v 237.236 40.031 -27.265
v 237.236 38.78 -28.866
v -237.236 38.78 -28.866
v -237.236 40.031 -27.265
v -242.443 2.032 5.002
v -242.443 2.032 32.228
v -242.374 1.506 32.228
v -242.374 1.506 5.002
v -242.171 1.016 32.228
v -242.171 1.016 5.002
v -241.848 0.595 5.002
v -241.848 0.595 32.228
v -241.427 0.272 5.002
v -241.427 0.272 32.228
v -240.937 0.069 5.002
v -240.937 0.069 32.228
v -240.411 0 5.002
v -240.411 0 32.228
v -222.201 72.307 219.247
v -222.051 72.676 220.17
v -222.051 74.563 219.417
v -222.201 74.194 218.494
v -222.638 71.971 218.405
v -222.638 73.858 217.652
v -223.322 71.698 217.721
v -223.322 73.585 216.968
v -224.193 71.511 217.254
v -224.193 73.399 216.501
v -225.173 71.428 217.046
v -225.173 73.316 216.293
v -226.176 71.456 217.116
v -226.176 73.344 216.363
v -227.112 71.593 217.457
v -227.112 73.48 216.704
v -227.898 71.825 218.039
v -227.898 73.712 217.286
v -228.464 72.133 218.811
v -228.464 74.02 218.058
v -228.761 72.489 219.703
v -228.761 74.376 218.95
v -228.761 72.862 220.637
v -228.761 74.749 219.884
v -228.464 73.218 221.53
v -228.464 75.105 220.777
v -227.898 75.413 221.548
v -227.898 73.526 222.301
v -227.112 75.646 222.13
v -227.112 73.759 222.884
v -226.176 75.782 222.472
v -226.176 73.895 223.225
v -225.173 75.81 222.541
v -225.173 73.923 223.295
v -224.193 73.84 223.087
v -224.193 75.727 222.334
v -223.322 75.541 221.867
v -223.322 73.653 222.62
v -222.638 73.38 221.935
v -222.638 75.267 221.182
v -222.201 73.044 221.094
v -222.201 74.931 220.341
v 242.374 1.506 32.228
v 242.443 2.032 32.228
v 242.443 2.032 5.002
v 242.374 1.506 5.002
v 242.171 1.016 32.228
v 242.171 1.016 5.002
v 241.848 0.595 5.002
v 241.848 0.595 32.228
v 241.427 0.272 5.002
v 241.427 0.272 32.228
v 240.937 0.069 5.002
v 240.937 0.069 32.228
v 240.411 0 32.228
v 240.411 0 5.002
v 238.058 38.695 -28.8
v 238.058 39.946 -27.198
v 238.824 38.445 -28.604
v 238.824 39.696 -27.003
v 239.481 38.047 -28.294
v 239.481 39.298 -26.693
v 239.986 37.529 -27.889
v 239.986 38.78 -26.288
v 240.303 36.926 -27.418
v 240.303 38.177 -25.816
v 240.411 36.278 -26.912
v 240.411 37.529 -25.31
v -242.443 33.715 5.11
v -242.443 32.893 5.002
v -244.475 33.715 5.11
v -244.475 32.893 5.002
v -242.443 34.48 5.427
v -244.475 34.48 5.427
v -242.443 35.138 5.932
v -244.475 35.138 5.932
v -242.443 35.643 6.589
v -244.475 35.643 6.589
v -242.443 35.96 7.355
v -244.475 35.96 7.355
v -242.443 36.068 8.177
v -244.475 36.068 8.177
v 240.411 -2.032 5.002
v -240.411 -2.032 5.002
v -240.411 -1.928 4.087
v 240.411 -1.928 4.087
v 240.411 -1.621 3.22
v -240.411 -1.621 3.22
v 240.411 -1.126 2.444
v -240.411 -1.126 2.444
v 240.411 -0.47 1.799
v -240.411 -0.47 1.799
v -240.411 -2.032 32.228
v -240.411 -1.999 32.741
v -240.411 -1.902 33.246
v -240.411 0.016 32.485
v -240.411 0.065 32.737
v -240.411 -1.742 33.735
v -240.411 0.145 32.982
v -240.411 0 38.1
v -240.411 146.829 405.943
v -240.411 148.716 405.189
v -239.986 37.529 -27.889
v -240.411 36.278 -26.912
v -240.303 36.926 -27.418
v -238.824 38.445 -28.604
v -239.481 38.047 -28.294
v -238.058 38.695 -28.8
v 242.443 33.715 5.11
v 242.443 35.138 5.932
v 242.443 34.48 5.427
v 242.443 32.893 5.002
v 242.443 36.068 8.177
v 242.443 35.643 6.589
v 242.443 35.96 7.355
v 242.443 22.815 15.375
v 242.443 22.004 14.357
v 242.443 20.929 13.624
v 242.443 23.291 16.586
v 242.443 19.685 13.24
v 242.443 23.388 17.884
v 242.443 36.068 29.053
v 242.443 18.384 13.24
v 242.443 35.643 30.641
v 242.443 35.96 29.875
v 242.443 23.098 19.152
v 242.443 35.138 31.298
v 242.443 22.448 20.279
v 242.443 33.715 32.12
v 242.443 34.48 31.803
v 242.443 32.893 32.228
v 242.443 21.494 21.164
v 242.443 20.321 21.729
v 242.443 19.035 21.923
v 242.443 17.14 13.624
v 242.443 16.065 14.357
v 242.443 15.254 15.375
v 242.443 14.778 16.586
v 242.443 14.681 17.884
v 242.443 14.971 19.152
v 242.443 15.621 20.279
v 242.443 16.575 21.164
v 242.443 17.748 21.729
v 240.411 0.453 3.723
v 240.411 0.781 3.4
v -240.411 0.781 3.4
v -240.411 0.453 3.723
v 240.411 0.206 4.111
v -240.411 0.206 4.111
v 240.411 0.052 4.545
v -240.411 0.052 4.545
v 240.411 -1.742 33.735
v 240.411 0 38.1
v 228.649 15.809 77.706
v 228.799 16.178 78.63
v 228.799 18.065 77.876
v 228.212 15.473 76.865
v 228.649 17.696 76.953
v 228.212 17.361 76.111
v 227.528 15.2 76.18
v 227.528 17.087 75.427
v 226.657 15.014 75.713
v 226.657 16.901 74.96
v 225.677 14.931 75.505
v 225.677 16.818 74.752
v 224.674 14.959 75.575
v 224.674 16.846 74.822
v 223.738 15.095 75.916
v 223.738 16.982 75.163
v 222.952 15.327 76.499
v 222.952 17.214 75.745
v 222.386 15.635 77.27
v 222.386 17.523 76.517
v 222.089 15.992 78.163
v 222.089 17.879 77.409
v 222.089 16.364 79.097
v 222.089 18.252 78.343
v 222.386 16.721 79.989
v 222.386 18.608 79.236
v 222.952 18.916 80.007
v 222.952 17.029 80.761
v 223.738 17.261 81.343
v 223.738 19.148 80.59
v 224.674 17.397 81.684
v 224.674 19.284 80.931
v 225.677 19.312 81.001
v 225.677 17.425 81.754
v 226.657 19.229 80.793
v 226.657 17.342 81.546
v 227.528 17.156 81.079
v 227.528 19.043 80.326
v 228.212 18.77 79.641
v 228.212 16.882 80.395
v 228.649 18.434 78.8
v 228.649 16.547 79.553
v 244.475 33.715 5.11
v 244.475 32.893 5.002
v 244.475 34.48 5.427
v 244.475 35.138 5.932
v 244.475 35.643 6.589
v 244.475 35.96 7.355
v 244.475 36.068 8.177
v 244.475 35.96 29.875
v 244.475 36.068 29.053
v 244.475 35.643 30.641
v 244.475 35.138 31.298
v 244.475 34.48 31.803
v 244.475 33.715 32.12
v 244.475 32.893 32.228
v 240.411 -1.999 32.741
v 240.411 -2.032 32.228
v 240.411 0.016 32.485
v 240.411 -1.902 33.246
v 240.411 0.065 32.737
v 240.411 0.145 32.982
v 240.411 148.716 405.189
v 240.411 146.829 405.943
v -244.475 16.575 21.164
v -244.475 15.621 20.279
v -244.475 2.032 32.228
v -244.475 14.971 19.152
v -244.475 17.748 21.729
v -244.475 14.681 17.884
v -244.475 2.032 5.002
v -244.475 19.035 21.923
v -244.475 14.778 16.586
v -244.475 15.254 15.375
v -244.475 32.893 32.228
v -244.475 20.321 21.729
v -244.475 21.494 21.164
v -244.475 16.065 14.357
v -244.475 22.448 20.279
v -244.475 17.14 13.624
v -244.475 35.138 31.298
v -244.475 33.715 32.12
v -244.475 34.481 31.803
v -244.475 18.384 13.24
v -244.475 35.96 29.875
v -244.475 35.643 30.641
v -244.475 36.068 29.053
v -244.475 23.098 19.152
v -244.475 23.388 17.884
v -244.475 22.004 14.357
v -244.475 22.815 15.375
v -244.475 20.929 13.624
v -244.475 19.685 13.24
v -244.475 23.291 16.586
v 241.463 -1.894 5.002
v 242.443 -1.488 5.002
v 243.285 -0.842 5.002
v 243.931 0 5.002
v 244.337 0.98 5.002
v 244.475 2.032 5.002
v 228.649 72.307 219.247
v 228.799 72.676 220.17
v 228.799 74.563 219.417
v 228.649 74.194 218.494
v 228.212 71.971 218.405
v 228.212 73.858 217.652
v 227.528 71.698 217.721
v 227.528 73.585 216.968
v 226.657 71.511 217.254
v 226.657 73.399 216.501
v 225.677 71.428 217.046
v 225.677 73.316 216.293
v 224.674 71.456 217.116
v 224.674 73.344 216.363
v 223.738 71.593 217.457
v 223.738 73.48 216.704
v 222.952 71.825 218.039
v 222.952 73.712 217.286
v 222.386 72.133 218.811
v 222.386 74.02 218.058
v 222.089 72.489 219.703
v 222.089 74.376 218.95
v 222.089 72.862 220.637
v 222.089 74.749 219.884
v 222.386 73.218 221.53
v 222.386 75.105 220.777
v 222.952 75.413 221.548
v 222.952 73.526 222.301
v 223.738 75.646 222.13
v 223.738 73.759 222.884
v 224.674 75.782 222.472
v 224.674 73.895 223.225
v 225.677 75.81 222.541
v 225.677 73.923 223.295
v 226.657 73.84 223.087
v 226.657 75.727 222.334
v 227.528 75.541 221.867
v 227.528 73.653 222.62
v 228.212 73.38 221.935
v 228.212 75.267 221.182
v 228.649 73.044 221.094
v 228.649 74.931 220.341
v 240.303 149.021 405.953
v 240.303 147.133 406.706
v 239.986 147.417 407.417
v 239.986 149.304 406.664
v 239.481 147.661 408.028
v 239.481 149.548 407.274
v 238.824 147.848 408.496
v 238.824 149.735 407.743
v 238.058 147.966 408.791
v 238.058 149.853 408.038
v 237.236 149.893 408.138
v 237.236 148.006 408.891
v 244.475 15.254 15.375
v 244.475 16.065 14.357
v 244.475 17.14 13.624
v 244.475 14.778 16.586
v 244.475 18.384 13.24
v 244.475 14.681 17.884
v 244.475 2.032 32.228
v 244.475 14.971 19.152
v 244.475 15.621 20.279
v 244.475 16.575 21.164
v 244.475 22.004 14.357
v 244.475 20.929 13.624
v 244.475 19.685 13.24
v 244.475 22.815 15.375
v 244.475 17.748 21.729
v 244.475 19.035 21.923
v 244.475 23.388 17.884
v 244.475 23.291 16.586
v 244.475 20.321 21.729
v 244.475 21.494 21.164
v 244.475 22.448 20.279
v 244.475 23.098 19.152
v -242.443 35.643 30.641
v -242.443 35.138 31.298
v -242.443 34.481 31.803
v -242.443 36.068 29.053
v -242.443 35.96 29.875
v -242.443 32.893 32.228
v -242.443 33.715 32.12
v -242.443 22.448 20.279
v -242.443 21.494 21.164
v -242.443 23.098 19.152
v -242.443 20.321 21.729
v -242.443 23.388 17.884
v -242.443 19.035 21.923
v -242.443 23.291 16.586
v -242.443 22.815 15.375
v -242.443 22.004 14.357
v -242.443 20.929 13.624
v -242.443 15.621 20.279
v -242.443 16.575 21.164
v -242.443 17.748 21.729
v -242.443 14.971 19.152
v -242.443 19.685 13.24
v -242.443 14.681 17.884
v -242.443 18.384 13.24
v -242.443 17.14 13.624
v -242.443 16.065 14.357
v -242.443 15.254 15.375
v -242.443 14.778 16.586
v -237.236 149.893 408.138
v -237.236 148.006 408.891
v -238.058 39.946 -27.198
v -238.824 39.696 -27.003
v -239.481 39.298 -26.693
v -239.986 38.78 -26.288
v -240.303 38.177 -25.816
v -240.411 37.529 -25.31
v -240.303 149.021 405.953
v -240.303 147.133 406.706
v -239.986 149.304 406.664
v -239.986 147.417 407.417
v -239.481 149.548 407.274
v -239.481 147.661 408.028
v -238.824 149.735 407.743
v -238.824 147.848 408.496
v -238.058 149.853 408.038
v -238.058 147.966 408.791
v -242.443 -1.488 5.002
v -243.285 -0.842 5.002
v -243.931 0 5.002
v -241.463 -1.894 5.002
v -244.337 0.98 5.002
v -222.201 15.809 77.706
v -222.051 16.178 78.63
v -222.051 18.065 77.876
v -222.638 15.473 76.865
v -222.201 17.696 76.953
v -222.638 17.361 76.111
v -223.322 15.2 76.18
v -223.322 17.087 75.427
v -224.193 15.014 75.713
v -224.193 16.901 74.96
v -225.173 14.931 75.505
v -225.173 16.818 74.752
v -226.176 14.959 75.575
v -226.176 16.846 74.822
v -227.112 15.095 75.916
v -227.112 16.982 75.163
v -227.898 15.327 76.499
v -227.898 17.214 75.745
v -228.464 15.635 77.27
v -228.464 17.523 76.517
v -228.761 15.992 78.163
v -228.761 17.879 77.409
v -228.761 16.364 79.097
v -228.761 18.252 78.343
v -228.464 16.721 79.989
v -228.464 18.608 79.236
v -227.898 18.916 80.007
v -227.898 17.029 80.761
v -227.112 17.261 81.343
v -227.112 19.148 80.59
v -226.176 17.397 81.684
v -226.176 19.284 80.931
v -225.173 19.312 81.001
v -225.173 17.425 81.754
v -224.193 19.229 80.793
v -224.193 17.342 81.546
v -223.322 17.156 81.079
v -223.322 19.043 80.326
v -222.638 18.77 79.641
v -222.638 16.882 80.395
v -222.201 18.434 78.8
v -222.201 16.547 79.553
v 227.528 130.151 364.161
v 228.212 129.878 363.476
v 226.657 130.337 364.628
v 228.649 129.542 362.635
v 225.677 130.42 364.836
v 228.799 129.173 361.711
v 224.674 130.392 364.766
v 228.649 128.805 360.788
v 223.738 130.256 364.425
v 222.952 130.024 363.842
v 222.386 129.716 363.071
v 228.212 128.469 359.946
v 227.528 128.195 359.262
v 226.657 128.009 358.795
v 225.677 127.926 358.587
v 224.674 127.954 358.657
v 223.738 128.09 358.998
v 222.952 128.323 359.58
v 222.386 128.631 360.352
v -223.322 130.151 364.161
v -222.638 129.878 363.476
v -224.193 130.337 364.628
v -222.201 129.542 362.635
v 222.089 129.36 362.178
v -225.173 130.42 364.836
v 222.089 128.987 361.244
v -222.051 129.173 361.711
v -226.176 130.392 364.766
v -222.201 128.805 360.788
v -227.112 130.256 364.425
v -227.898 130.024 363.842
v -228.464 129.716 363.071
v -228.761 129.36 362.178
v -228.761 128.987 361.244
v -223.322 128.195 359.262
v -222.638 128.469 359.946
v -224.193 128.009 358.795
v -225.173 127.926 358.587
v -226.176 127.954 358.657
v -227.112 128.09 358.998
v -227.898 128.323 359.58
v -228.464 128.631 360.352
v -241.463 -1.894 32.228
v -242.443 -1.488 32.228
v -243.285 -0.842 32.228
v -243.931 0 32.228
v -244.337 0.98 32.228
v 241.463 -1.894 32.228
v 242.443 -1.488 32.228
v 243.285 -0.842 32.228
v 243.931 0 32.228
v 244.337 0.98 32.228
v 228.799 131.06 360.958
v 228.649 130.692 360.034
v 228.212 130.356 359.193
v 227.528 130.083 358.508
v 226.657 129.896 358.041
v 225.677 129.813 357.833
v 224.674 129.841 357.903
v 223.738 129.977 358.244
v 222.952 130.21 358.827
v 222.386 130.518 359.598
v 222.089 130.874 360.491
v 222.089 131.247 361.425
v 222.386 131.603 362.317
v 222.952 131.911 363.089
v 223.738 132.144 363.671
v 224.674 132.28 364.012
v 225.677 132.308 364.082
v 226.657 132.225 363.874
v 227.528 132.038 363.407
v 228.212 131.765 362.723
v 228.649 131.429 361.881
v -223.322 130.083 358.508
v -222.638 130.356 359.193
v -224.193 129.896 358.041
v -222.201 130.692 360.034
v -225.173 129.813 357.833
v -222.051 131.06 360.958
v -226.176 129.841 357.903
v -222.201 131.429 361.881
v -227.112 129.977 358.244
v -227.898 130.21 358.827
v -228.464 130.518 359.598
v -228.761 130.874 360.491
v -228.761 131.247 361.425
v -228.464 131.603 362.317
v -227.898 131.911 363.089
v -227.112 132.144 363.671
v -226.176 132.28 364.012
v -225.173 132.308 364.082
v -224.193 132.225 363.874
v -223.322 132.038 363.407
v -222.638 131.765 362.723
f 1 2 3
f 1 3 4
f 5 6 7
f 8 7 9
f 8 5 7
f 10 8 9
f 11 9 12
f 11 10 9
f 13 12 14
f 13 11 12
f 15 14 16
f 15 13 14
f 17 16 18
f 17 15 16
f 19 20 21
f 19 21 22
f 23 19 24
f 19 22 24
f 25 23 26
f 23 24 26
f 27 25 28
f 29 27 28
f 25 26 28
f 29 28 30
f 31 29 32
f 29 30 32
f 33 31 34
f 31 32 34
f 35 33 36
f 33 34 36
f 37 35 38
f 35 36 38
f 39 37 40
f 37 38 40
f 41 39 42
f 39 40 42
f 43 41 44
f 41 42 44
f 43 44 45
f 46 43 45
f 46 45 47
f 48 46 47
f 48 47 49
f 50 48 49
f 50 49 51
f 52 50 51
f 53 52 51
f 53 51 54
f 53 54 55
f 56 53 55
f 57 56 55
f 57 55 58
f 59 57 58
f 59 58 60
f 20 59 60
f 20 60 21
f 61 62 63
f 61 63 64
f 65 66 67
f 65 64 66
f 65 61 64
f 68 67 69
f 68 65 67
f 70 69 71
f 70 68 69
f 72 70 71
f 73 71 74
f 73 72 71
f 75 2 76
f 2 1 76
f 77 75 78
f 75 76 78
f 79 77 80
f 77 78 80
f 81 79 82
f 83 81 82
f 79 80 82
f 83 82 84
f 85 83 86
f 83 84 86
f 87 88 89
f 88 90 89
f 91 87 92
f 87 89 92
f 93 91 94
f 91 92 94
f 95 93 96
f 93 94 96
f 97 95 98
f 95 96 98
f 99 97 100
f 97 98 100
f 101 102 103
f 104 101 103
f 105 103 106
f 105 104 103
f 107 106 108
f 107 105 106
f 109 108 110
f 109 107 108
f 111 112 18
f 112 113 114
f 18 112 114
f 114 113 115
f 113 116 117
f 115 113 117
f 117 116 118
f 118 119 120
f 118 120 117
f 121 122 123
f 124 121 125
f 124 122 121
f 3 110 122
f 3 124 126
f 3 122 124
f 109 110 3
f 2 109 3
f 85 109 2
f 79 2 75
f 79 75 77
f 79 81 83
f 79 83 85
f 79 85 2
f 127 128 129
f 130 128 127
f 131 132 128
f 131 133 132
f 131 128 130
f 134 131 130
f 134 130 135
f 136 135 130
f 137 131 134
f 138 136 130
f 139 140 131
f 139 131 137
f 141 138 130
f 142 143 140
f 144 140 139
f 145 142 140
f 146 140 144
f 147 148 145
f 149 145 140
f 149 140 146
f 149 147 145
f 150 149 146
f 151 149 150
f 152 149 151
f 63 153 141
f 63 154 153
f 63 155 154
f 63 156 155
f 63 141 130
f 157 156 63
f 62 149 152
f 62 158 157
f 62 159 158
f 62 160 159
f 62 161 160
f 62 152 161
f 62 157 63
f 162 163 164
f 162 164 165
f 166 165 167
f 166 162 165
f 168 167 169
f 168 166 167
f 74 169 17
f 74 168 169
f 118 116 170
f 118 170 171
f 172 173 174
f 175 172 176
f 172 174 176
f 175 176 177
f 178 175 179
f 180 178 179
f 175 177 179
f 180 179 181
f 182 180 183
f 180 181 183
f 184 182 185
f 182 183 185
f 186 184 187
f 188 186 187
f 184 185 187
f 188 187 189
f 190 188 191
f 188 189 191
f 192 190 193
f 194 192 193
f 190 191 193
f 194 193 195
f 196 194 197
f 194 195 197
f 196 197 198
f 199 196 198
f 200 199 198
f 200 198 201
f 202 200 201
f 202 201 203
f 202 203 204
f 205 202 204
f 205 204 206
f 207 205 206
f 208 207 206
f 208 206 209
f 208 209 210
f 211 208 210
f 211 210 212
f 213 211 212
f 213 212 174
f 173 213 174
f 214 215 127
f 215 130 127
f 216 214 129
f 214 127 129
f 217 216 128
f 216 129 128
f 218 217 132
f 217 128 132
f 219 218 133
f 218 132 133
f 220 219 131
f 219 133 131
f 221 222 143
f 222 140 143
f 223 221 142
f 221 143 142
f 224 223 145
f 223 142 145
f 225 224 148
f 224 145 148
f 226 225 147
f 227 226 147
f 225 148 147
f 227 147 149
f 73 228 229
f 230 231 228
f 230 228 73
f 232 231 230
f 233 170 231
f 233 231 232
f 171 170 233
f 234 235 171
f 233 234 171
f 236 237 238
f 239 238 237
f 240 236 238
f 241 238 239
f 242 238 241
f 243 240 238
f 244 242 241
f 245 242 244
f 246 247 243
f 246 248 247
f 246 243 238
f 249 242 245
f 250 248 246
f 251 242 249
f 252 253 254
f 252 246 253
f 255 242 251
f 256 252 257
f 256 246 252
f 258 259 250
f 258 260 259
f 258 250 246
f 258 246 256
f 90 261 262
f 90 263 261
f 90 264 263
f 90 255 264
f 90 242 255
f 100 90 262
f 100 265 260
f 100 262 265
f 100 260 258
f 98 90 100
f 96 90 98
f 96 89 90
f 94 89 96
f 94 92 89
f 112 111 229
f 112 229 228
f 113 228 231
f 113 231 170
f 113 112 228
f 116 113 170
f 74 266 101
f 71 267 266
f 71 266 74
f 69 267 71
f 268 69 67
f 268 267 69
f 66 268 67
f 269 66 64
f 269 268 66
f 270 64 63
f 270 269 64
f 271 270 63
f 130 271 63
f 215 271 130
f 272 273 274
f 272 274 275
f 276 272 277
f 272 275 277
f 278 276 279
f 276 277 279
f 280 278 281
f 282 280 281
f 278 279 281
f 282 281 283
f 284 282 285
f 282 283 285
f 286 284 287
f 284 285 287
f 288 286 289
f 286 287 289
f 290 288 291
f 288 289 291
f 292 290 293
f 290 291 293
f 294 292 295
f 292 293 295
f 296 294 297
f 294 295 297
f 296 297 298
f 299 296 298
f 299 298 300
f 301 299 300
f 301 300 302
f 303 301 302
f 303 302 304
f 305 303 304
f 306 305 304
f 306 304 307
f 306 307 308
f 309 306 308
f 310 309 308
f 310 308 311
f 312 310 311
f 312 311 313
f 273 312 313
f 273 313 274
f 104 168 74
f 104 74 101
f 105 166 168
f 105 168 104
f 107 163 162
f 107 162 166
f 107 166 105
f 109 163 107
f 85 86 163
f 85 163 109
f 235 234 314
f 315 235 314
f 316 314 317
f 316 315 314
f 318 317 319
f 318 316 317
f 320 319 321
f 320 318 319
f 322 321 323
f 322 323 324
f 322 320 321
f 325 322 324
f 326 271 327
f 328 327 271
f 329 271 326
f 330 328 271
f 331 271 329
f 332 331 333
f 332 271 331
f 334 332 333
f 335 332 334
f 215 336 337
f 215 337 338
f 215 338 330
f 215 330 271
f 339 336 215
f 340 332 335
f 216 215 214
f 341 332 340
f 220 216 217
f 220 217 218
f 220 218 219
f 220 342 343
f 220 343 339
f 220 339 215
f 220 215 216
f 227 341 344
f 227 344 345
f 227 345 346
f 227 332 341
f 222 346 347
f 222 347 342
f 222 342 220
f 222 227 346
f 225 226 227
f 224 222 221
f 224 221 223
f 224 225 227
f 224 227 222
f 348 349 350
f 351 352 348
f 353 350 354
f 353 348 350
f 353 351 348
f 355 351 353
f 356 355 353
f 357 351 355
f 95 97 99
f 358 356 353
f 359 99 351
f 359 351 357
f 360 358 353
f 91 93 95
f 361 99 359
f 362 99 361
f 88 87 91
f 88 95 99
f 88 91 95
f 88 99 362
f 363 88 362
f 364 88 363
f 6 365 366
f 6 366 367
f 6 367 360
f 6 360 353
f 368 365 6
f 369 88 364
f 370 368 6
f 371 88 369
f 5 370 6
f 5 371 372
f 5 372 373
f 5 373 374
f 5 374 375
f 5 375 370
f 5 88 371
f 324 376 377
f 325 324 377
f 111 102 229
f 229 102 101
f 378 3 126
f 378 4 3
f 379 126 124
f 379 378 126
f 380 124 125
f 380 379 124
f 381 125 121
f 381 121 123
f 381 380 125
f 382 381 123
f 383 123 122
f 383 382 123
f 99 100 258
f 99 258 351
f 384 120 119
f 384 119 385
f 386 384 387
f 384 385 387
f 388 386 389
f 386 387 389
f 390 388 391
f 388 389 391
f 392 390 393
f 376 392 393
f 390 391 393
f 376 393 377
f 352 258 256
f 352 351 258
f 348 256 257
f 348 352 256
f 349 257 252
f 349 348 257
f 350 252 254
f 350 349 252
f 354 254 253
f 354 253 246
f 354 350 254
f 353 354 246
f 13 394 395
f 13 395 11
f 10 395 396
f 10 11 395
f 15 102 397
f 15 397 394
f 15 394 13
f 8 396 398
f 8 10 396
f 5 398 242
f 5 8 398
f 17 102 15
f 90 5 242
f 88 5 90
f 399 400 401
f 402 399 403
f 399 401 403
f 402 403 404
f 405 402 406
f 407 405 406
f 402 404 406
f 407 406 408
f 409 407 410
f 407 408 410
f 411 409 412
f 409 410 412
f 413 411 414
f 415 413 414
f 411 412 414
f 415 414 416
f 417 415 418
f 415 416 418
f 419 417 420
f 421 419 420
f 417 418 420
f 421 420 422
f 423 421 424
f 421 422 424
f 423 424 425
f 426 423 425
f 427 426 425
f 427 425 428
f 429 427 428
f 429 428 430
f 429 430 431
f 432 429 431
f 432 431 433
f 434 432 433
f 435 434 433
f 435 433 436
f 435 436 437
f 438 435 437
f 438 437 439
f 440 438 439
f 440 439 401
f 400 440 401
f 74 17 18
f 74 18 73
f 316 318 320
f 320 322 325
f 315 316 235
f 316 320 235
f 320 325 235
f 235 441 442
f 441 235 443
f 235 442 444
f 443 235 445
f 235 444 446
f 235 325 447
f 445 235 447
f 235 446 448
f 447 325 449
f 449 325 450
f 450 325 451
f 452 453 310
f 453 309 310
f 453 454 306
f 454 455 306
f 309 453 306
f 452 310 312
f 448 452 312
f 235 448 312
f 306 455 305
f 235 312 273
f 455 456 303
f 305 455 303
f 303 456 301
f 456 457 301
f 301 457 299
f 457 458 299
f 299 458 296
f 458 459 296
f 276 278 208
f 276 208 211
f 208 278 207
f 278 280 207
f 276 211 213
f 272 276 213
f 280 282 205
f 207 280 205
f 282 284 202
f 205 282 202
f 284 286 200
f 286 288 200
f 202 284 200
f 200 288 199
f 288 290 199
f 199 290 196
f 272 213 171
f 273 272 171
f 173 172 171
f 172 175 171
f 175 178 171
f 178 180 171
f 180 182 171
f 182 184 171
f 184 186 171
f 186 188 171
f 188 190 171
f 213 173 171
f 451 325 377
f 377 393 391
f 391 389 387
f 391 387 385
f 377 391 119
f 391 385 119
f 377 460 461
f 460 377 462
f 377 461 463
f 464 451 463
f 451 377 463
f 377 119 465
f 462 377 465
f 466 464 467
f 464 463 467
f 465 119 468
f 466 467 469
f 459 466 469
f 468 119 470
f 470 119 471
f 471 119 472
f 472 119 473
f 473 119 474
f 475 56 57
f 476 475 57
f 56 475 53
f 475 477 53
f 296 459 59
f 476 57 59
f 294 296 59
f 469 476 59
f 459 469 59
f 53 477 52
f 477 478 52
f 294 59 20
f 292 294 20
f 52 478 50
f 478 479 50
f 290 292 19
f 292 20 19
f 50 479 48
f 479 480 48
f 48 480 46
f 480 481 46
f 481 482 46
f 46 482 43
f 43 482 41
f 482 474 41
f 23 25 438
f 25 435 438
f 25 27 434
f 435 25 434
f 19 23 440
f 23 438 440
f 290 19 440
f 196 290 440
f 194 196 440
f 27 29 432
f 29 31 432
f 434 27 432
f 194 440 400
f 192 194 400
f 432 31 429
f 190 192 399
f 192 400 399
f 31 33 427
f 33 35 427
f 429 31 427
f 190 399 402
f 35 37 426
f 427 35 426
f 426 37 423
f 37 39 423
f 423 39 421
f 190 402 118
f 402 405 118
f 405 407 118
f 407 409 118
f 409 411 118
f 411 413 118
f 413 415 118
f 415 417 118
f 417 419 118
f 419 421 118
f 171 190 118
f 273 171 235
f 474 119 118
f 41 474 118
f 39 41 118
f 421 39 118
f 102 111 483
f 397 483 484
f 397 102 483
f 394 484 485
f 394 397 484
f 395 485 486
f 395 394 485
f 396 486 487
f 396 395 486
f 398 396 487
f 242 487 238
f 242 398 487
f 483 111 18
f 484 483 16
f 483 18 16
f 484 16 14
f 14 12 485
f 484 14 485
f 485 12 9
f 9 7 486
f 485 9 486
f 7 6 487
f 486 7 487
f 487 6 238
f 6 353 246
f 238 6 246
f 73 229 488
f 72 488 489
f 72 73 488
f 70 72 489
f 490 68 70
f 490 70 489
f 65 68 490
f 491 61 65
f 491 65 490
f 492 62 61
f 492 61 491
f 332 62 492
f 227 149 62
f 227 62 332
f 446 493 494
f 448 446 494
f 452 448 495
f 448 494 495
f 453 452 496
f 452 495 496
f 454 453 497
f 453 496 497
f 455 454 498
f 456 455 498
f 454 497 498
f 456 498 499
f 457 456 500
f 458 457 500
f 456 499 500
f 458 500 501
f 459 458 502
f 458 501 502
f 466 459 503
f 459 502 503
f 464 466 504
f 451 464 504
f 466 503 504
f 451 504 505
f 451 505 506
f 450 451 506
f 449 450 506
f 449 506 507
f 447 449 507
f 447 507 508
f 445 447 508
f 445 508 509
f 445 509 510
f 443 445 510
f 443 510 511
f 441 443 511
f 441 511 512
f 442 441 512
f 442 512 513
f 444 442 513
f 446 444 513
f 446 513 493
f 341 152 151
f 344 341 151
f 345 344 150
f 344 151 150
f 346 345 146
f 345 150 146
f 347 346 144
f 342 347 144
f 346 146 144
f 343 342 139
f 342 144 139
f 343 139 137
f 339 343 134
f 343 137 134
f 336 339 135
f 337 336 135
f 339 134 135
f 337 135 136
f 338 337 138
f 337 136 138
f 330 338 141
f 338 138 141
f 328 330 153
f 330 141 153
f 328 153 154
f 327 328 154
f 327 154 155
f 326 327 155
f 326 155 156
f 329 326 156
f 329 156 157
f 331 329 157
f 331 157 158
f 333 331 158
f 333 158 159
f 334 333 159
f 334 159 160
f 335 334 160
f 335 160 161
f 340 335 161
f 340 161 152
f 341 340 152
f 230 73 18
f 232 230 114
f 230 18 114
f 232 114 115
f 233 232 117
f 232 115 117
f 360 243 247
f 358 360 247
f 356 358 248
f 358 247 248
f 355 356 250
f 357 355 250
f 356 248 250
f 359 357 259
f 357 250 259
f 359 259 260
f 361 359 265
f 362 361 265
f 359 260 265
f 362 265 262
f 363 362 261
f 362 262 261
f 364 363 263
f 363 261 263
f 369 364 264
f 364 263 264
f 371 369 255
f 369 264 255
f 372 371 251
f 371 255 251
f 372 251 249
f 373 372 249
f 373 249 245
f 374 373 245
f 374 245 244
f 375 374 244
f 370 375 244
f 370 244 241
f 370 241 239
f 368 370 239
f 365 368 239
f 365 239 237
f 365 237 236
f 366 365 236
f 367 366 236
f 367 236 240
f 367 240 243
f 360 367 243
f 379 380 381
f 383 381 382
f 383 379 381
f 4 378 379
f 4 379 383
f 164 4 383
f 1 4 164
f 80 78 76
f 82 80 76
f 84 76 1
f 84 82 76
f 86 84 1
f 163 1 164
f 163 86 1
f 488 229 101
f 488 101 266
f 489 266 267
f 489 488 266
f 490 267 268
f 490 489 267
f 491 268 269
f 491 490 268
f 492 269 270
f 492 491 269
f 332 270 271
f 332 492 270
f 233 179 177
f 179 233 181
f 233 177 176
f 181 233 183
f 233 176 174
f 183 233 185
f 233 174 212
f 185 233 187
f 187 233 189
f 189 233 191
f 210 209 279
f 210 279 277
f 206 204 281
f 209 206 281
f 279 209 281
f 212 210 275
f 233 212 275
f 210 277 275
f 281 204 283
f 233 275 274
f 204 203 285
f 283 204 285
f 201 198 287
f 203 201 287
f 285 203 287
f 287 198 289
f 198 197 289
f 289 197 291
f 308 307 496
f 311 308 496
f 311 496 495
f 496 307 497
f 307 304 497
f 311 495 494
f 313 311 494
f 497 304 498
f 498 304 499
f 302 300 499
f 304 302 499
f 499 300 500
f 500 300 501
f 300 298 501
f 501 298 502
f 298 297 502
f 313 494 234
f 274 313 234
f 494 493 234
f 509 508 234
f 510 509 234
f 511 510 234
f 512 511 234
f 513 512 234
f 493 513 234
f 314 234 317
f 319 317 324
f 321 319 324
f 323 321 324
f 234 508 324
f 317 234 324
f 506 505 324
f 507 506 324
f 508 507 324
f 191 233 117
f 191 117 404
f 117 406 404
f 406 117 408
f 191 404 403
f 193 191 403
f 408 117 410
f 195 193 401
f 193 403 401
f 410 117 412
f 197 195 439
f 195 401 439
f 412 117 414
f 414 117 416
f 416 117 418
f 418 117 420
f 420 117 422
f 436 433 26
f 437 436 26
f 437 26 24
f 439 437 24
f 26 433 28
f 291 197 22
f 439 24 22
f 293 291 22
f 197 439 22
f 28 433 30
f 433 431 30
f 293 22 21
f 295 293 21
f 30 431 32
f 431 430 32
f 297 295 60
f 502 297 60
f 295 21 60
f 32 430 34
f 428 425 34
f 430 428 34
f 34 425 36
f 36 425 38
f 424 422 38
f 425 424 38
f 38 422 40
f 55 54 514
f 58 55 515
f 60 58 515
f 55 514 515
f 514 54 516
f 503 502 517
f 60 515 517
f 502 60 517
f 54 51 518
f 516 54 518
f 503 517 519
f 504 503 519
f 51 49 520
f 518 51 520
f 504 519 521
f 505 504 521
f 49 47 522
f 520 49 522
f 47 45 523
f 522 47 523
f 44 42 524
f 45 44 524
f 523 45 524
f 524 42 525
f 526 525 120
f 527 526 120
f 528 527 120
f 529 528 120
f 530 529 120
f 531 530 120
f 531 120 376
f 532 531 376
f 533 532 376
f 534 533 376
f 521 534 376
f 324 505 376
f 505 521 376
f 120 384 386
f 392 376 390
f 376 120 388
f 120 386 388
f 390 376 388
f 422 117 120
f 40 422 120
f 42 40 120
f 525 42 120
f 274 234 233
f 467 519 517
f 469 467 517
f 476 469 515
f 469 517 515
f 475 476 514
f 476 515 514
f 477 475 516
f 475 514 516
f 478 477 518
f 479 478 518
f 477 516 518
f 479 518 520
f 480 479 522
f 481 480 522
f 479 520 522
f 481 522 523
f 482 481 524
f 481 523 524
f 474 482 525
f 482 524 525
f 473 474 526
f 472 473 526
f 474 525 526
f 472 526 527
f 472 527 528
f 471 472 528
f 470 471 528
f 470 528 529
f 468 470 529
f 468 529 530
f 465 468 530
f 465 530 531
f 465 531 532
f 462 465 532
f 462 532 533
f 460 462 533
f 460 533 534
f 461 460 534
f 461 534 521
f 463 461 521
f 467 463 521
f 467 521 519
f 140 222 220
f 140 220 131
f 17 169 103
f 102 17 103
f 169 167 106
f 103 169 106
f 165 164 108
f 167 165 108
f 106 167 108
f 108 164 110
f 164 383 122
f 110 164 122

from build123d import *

# Parameters (mm, degrees)
SKETCH1_W                        = 480.822
SKETCH1_H                        = 76.2
BASE_FLANGE1_DEPTH               = 2.032
EDGE_FLANGE3_START               = -240.411
EDGE_FLANGE3_DEPTH               = 480.822
EDGE_FLANGE3_2_DEPTH             = 480.822
EDGE_FLANGE1_DEPTH               = 70.328201504
EDGE_FLANGE1_BEND_DEPTH          = 70.328201504
EDGE_FLANGE2_DEPTH               = 480.822
F_11_32_0_34375_DIAMETER_HOLE1_D = 8.73125
F_17_64_0_26563_DIAMETER_HOLE1_D = 6.747002
FILLET1_R                        = 3.175
SKETCH25_W                       = 47.165600752
SKETCH25_H                       = 38.1
CUT_EXTRUDE1_DEPTH               = 655.776434505
EDGE_FLANGE4_DEPTH               = 480.822
FILLET2_R                        = 3.175


# Read off the part's stored shape, not the designer's step: Edge-Flange3
# Sheet-metal steps are written as plain solids
with BuildPart() as part:
    # Sketch1 → Base-Flange1 (new body)
    with BuildSketch(Plane(origin=(0, 0, 0), x_dir=(1, 0, 0), z_dir=(0, 1, 0))):
        Rectangle(SKETCH1_W, SKETCH1_H)
    extrude(amount=-BASE_FLANGE1_DEPTH)

    # Edge-Flange3 outline → Edge-Flange3 (cut)
    with BuildSketch(Plane.YZ.offset(EDGE_FLANGE3_START)):
        with BuildLine():
            ThreePointArc((-2.032, 32.228201504), (-1.958948217, 32.995292327), (-1.742419128, 33.734805713))
            Line((-1.742419128, 33.734805713), (0, 38.1))
            Line((0, 38.1), (-2.032, 38.1))
            Line((-2.032, 38.1), (-2.032, 32.228201504))
        make_face()
    extrude(amount=EDGE_FLANGE3_DEPTH, mode=Mode.SUBTRACT)

    # Edge-Flange3 2 outline → Edge-Flange3 2 (add)
    with BuildSketch(Plane.YZ.offset(EDGE_FLANGE3_START)):
        with BuildLine():
            Line((148.005784856, 408.891387665), (0, 38.1))
            Line((0, 38.1), (0, 32.228201504))
            ThreePointArc((0, 32.228201504), (0.036525892, 32.611746915), (0.144790436, 32.981503608))
            Line((0.144790436, 32.981503608), (149.89299442, 408.13808556))
            Line((149.89299442, 408.13808556), (148.005784856, 408.891387665))
        make_face()
    extrude(amount=EDGE_FLANGE3_2_DEPTH)

    # Edge-Flange1 section (across the edge) → Edge-Flange1 (add)
    with BuildSketch(Plane(origin=(-242.443, 0, -38.1), x_dir=(1, 0, 0), z_dir=(0, 0, 1))):
        with BuildLine():
            Line((-2.032, 2.032), (-2.032, 36.068))
            Line((-2.032, 36.068), (0, 36.068))
            Line((0, 36.068), (0, 2.032))
            ThreePointArc((0, 2.032), (0.595159021, 0.595159021), (2.032, 0))
            Line((2.032, 0), (2.032, -2.032))
            ThreePointArc((2.032, -2.032), (-0.841681959, -0.841681959), (-2.032, 2.032))
        make_face()
    extrude(amount=EDGE_FLANGE1_DEPTH)

    # Edge-Flange1 section 2 (across the edge) → Edge-Flange1 bend (add)
    with BuildSketch(Plane(origin=(242.443, 0, 32.228201504), x_dir=(-1, 0, 0), z_dir=(0, 0, -1))):
        with BuildLine():
            Line((-2.032, 2.032), (-2.032, 36.068))
            Line((-2.032, 36.068), (0, 36.068))
            Line((0, 36.068), (0, 2.032))
            ThreePointArc((0, 2.032), (0.595159021, 0.595159021), (2.032, 0))
            Line((2.032, 0), (2.032, -2.032))
            ThreePointArc((2.032, -2.032), (-0.841681959, -0.841681959), (-2.032, 2.032))
        make_face()
    extrude(amount=EDGE_FLANGE1_BEND_DEPTH)

    # Edge-Flange2 section (across the edge) → Edge-Flange2 (add)
    with BuildSketch(Plane(origin=(240.411, 0, -40.132), x_dir=(0, 0, 1), z_dir=(-1, 0, 0))):
        with BuildLine():
            Line((-2.032, 2.032), (-2.032, 36.068))
            Line((-2.032, 36.068), (0, 36.068))
            Line((0, 36.068), (0, 2.032))
            ThreePointArc((0, 2.032), (0.595159021, 0.595159021), (2.032, 0))
            Line((2.032, 0), (2.032, -2.032))
            ThreePointArc((2.032, -2.032), (-0.841681959, -0.841681959), (-2.032, 2.032))
        make_face()
    extrude(amount=EDGE_FLANGE2_DEPTH)

    # 11/32 (0.34375) Diameter Hole1 (through all)
    with Locations(Plane(origin=(244.475, 0, 0), x_dir=(0, 0, -1), z_dir=(1, 0, 0))):
        with Locations((-17.557349869, 19.03458979)):
            Hole(F_11_32_0_34375_DIAMETER_HOLE1_D / 2)

    # 17/64 (0.26563) Diameter Hole1 (through all)
    with Locations(Plane(origin=(0, -13.117977393, 5.236196428), x_dir=(-1, 0, 0), z_dir=(0, -0.9287448642521535, 0.370719539713311))):
        with Locations((225.425, -79.024412767), (225.425, -231.424412767), (225.425, -383.824412767), (-225.425, -383.824412767), (-225.425, -231.424412767), (-225.425, -79.024412767)):
            Hole(F_17_64_0_26563_DIAMETER_HOLE1_D / 2)

    # Fillet1
    fillet1_edges = [part.edges().sort_by_distance(p)[0] for p in [
        (-240.411, 148.949389638, 408.514736612),
        (240.411, 148.949389638, 408.514736612),
        (-243.459, 36.068, -38.1),
        (-243.459, 36.068, 32.228201504),
        (243.459, 36.068, 32.228201504),
        (243.459, 36.068, -38.1),
        (240.411, 36.068, -41.148),
        (-240.411, 36.068, -41.148),
    ]]
    fillet(fillet1_edges, radius=FILLET1_R)

    # Sketch25 → Cut-Extrude1 (cut, through all)
    with BuildSketch(Plane(origin=(244.475, 0, 0), x_dir=(0, 0, -1), z_dir=(1, 0, 0))):
        with Locations((18.581199624, 17.018)):
            Rectangle(SKETCH25_W, SKETCH25_H)
    extrude(amount=-CUT_EXTRUDE1_DEPTH, mode=Mode.SUBTRACT)

    # Edge-Flange4 section (across the edge) → Edge-Flange4 (add)
    with BuildSketch(Plane(origin=(240.411, 0, 4.010528132), x_dir=(0, 0.6156614753256621, 0.788010753606719), z_dir=(-1, 0, 0))):
        with BuildLine():
            Line((-2.032, 0.99107262), (-2.032, 50.8))
            Line((-2.032, 50.8), (0, 50.8))
            Line((0, 50.8), (0, 0.99107262))
            ThreePointArc((0, 0.99107262), (0.205650498, 0.10030245), (0.780975882, -0.610165231))
            Line((0.780975882, -0.610165231), (-0.470048236, -2.211403083))
            ThreePointArc((-0.470048236, -2.211403083), (-1.620699004, -0.790467721), (-2.032, 0.99107262))
        make_face()
    extrude(amount=EDGE_FLANGE4_DEPTH)

    # Fillet2
    fillet2_edges = [part.edges().sort_by_distance(p)[0] for p in [
        (-243.459, 36.068, 5.001600752),
        (243.459, 36.068, 5.001600752),
        (240.411, 39.405434224, -28.06569374),
        (-240.411, 39.405434224, -28.06569374),
    ]]
    fillet(fillet2_edges, radius=FILLET2_R)


solid = part.part
